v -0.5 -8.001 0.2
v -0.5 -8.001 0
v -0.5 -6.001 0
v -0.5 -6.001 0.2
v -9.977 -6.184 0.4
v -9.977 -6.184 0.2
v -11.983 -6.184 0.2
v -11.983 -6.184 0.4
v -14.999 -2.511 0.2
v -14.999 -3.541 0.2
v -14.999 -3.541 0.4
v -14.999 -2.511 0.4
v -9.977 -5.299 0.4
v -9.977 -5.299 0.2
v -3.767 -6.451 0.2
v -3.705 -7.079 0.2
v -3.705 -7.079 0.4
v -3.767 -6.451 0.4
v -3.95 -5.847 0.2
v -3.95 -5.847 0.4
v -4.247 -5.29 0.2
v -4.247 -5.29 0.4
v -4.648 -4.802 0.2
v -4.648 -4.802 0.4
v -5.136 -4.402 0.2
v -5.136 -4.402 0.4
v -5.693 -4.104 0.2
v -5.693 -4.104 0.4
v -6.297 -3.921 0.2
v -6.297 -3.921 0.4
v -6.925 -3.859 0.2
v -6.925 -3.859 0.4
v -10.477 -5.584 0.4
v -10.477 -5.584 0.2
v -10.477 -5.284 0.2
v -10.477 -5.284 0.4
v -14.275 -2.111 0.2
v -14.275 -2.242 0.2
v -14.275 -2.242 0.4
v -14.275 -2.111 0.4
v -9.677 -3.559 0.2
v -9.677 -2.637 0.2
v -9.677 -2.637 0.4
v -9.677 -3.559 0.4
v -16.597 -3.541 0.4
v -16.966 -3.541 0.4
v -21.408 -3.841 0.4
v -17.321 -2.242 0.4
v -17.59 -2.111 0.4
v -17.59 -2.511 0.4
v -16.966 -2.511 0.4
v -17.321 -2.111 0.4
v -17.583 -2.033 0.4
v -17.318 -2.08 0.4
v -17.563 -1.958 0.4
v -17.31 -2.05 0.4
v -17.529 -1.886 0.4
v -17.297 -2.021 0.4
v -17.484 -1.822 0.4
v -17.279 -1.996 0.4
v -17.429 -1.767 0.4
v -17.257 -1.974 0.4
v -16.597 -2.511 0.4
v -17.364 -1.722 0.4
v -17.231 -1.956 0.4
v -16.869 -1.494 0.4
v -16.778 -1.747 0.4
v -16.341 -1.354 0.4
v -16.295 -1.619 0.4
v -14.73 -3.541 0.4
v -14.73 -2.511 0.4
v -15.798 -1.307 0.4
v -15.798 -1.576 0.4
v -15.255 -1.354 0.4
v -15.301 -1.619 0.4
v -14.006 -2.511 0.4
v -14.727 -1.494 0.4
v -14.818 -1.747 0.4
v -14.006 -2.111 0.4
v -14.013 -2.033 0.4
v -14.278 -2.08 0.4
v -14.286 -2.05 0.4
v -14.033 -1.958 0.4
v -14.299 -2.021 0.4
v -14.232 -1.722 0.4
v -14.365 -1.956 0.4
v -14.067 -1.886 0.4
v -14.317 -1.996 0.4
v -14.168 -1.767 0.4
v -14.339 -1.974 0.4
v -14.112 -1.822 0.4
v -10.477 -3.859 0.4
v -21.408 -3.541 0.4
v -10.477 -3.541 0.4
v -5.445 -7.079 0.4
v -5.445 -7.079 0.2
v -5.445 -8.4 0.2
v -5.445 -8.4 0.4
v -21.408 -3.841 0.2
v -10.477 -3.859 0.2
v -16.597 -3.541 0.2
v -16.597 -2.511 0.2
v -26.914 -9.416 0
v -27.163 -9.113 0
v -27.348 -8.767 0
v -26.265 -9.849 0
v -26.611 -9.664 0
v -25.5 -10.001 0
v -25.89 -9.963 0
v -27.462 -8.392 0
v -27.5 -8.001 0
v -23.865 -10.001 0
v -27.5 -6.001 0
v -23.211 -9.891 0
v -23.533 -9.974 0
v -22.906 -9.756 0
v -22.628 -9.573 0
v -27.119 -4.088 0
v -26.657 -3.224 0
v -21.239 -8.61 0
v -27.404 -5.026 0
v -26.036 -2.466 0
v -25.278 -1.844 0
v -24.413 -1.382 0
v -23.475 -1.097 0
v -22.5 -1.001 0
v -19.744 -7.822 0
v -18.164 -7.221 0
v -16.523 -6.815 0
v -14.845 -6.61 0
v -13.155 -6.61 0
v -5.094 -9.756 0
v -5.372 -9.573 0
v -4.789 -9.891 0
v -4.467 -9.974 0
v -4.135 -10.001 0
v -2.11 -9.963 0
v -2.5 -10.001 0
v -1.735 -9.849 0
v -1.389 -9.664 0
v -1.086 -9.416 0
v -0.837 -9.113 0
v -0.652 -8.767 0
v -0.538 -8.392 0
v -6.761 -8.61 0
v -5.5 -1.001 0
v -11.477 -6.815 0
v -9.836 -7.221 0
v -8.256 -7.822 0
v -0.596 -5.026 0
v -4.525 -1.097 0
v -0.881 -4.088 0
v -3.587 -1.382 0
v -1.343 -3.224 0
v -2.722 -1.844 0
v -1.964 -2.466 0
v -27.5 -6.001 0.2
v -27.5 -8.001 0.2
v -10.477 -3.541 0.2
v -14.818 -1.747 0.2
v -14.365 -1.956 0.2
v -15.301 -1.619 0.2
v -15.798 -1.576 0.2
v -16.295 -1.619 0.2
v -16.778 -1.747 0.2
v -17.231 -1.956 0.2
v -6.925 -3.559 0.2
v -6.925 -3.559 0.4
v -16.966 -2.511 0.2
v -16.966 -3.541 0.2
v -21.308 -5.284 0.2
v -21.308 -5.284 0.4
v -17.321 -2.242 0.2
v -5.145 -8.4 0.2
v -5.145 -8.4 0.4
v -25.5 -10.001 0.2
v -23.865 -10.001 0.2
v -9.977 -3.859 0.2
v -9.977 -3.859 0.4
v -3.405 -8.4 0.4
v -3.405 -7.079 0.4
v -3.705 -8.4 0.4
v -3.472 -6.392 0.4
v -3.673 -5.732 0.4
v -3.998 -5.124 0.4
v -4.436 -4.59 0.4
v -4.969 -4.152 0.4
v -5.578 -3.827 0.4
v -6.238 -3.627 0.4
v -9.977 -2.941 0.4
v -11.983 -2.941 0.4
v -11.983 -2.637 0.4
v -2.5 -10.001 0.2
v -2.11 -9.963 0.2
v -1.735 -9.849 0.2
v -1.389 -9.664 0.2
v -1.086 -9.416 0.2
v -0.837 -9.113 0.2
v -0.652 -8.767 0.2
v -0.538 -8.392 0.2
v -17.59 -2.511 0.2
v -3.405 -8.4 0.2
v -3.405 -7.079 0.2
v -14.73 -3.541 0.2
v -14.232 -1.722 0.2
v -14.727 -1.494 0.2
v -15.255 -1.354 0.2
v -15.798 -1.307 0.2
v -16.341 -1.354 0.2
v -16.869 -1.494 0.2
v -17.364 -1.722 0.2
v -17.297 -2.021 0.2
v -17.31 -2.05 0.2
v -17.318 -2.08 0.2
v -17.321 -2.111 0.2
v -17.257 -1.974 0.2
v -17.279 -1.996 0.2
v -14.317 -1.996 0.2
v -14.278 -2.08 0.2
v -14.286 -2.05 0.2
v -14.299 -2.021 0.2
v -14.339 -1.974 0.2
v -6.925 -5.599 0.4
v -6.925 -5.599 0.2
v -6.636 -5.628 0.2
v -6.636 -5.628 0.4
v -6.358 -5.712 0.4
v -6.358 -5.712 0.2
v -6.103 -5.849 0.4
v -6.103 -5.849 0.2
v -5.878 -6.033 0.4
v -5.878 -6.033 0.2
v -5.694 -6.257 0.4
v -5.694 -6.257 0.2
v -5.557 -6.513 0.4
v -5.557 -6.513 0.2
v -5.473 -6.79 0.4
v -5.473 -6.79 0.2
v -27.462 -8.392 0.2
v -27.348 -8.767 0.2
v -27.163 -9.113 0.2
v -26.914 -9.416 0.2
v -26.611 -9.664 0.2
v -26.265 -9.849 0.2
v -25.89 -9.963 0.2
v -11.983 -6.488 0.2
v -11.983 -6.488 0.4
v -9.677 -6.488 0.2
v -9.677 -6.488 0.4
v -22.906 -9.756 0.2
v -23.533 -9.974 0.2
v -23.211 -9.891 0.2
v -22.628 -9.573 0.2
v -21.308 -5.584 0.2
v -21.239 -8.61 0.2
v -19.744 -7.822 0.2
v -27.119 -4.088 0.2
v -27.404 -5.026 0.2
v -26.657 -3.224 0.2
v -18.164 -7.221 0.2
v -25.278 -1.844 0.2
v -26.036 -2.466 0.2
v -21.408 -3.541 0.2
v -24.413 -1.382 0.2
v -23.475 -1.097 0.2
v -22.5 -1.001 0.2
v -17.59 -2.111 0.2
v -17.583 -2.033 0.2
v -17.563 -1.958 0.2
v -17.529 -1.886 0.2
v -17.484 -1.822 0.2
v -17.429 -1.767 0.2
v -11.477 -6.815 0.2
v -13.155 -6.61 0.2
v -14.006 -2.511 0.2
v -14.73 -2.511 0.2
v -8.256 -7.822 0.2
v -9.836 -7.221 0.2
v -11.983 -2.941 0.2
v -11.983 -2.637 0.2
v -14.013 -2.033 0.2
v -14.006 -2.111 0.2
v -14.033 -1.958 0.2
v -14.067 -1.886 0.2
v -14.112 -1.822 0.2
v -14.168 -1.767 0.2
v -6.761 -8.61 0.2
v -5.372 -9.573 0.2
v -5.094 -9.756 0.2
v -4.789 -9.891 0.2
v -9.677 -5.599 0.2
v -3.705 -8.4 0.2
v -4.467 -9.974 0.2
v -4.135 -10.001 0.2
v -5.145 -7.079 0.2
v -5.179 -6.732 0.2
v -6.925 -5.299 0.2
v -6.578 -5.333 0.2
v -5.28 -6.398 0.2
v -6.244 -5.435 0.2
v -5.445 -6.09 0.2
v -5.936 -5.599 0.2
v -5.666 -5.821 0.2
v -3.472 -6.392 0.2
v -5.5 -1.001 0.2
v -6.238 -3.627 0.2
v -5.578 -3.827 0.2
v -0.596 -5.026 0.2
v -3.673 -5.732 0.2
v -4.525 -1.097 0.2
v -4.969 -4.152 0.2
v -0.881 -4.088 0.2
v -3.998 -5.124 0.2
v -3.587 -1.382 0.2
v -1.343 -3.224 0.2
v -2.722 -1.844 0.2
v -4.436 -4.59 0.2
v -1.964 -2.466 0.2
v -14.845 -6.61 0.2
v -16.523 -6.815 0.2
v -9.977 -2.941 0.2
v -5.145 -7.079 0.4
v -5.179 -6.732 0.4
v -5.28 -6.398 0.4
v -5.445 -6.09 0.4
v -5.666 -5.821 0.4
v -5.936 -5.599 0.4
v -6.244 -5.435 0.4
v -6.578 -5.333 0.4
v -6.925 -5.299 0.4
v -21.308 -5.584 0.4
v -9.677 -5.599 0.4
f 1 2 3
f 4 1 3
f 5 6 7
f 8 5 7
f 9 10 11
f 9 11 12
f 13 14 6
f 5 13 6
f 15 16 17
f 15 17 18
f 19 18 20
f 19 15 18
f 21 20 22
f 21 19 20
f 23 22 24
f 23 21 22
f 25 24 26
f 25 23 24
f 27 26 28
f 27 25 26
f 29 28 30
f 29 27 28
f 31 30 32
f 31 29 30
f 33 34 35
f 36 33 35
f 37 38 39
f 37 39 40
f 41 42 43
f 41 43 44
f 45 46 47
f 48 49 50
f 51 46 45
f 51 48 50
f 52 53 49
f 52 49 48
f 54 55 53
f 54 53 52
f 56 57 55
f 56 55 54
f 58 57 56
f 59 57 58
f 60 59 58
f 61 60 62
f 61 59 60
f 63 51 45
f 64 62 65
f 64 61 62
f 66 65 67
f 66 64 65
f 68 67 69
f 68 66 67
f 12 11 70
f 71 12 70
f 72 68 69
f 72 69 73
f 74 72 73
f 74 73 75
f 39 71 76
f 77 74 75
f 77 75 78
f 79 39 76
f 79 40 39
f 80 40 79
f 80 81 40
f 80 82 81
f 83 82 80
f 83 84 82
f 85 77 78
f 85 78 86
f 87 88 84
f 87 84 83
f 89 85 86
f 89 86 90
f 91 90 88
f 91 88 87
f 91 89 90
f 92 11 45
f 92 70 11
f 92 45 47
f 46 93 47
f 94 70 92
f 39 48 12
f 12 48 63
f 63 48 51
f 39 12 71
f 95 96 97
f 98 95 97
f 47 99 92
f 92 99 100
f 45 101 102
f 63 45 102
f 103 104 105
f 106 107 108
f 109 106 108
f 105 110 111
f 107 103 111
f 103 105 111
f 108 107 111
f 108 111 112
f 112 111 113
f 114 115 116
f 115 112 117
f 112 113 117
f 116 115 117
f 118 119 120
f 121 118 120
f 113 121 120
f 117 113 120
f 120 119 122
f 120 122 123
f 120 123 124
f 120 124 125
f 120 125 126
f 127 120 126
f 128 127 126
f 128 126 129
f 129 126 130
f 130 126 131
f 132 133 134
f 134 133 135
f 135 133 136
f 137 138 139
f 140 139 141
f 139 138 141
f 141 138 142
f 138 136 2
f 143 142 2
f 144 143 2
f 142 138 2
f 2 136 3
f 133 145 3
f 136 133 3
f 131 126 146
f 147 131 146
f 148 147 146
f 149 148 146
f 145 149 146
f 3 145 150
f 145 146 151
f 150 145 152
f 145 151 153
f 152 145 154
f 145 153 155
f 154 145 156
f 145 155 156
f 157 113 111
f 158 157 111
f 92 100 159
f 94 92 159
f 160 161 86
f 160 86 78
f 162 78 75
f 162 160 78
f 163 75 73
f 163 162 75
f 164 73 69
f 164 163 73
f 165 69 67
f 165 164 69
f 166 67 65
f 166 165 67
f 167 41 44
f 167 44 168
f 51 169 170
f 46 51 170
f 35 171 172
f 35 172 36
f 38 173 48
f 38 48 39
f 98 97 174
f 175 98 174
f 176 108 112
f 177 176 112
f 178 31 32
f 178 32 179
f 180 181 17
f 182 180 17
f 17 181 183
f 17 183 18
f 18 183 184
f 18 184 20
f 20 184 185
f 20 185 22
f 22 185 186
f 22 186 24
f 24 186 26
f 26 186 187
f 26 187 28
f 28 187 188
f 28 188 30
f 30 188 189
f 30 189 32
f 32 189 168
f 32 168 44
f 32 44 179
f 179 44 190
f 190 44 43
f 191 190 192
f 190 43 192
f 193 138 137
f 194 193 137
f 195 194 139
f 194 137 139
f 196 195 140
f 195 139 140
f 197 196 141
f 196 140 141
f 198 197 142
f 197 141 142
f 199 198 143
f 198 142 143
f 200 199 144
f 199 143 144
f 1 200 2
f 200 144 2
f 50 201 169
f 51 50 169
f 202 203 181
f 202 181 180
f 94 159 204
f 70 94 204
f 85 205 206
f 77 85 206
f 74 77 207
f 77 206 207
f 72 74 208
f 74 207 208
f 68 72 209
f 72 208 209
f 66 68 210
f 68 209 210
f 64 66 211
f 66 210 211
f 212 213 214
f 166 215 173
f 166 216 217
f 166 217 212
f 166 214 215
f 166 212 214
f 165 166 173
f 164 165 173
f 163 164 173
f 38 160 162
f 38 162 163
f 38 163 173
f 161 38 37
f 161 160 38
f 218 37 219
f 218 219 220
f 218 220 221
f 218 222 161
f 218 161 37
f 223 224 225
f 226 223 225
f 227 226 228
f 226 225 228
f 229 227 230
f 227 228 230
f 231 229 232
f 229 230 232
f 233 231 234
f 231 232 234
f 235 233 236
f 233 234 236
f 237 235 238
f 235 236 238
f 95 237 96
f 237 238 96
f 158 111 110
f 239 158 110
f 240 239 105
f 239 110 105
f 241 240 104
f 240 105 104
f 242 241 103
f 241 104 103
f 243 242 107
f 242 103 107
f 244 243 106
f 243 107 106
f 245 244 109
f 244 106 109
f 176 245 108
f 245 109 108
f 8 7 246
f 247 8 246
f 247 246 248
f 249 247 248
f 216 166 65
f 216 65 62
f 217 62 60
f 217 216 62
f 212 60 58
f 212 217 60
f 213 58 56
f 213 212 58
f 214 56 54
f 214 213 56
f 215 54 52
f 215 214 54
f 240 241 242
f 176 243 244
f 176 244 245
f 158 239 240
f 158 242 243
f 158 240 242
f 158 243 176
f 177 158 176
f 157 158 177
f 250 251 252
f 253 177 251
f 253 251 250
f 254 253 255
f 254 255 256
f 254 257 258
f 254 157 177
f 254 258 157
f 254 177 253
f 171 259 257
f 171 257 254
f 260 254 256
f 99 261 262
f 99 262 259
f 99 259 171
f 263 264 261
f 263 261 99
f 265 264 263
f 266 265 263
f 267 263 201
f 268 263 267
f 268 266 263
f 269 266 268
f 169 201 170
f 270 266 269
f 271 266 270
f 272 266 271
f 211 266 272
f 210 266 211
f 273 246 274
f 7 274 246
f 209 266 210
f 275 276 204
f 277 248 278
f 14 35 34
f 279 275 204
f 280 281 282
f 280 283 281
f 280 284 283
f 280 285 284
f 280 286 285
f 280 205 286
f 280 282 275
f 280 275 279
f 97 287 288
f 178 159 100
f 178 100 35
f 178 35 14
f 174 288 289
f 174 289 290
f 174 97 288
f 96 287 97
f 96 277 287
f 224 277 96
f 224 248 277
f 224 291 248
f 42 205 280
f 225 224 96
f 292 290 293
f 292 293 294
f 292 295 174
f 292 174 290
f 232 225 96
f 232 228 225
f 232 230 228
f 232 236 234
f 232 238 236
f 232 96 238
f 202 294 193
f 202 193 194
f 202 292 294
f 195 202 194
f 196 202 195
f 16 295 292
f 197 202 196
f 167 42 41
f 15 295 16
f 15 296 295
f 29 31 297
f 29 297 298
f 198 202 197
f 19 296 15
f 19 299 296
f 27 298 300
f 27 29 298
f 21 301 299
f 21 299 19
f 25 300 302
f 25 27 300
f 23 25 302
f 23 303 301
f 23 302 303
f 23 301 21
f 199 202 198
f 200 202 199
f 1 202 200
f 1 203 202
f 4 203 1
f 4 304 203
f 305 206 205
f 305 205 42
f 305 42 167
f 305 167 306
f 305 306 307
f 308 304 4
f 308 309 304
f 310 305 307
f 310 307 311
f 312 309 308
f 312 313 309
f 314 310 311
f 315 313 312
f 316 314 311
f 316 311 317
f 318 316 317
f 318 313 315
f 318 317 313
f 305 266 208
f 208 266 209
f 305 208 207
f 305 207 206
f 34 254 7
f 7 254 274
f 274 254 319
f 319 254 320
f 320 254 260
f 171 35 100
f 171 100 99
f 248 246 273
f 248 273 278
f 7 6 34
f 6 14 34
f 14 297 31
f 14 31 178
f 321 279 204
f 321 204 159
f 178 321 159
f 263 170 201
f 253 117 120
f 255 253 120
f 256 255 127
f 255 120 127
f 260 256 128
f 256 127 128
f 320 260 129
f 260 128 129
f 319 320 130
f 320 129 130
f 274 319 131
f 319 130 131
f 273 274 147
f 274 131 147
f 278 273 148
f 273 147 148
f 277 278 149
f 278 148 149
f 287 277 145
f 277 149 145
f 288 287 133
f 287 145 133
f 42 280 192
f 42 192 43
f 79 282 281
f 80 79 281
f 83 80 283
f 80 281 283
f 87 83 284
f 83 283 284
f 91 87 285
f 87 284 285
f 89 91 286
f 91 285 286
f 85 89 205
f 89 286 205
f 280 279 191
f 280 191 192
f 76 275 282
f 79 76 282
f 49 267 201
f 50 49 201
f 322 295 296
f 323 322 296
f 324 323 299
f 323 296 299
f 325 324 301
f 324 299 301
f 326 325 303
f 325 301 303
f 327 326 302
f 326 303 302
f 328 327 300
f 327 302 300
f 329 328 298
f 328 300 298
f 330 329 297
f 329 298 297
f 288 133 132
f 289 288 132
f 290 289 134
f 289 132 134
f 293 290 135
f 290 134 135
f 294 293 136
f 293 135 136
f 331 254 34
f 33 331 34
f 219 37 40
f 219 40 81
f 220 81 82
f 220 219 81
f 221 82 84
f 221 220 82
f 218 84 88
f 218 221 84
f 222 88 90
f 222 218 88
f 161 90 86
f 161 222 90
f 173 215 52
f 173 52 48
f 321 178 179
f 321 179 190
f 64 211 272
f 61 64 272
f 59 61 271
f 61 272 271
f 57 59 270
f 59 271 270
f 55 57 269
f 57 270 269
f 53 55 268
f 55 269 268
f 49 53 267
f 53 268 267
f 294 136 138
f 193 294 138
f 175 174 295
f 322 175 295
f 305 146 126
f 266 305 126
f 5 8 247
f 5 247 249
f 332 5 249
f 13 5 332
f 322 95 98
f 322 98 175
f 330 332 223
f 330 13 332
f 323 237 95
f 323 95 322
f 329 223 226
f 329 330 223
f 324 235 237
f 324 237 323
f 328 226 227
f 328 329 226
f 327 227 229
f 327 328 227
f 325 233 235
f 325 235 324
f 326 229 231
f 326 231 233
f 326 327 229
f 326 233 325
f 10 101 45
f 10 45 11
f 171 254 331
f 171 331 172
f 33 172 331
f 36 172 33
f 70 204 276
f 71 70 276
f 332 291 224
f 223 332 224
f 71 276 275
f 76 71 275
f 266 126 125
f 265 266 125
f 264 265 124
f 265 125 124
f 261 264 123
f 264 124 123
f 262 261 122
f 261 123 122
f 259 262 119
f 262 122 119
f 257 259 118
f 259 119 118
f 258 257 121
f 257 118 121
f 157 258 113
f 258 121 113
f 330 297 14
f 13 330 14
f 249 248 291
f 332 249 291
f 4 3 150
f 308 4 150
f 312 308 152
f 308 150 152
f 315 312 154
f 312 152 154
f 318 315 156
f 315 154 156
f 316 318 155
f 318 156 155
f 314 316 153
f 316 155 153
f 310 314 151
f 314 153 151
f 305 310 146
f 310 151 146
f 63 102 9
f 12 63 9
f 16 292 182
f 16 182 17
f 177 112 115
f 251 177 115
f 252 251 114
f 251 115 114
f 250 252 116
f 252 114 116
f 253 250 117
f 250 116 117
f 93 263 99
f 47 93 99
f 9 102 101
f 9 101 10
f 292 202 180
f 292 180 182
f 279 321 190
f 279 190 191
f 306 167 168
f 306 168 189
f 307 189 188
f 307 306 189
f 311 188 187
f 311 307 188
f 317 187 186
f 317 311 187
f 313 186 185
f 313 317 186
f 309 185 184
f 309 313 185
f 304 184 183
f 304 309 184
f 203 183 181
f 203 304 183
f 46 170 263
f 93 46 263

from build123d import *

# Parameters (mm, degrees)
EXTRUSION1_DEPTH = 0.2
ESQUISSE2_W      = 1.59785128
ESQUISSE2_H      = 1.03077013
ESQUISSE2_W_2    = 10.83121002
ESQUISSE2_H_2    = 0.3
EXTRUSION2_DEPTH = 0.2


with BuildPart() as part:
    # Esquisse1 → Extrusion1 (new body)
    with BuildSketch(Plane.XY):
        with BuildLine():
            Line((-27.5, -6.00142003), (-27.5, -8.00142003))
            ThreePointArc((-27.5, -8.00142003), (-26.914213562, -9.415633592), (-25.5, -10.00142003))
            Line((-25.5, -10.00142003), (-23.865139014, -10.00142003))
            ThreePointArc((-23.865139014, -10.00142003), (-23.210588236, -9.891278035), (-22.628130987, -9.572983309))
            ThreePointArc((-22.628130987, -9.572983309), (-14, -6.584637184), (-5.371869013, -9.572983309))
            ThreePointArc((-5.371869013, -9.572983309), (-4.789411764, -9.891278035), (-4.134860986, -10.00142003))
            Line((-4.134860986, -10.00142003), (-2.5, -10.00142003))
            ThreePointArc((-2.5, -10.00142003), (-1.085786438, -9.415633592), (-0.5, -8.00142003))
            Line((-0.5, -8.00142003), (-0.5, -6.00142003))
            ThreePointArc((-0.5, -6.00142003), (-1.964466094, -2.465886124), (-5.5, -1.00142003))
            Line((-5.5, -1.00142003), (-22.5, -1.00142003))
            ThreePointArc((-22.5, -1.00142003), (-26.035533906, -2.465886124), (-27.5, -6.00142003))
        make_face()
    extrude(amount=EXTRUSION1_DEPTH)

    # Esquisse2 → Extrusion2 (add)
    # profile 1 of 4: a face of its own
    with BuildSketch(Plane.XY.offset(0.2)):
        with BuildLine():
            Line((-14.730316635, -2.510657311), (-14.006042275, -2.510657311))
            Line((-14.006042275, -2.510657311), (-14.006042275, -2.111468697))
            ThreePointArc((-14.006042275, -2.111468697), (-14.066642884, -1.886467114), (-14.232049919, -1.722337108))
            ThreePointArc((-14.232049919, -1.722337108), (-15.798042275, -1.307063885), (-17.364034631, -1.722337108))
            ThreePointArc((-17.364034631, -1.722337108), (-17.529441665, -1.886467114), (-17.590042275, -2.111468697))
            Line((-17.590042275, -2.111468697), (-17.590042275, -2.510657311))
            Line((-17.590042275, -2.510657311), (-16.965767915, -2.510657311))
            Line((-16.965767915, -2.510657311), (-16.965767915, -3.541427441))
            Line((-16.965767915, -3.541427441), (-21.408442275, -3.541427441))
            Line((-21.408442275, -3.541427441), (-21.408442275, -3.841427441))
            Line((-21.408442275, -3.841427441), (-10.477242275, -3.859176516))
            Line((-10.477242275, -3.859176516), (-10.477242275, -3.541427441))
            Line((-10.477242275, -3.541427441), (-14.730316635, -3.541427441))
            Line((-14.730316635, -3.541427441), (-14.730316635, -2.510657311))
        make_face()
        with Locations((-15.798042275, -3.026042376)):
            Rectangle(ESQUISSE2_W, ESQUISSE2_H, mode=Mode.SUBTRACT)
        with BuildLine():
            Line((-17.321242275, -2.241857311), (-14.274842275, -2.241857311))
            Line((-14.274842275, -2.241857311), (-14.274842275, -2.111468697))
            ThreePointArc((-14.274842275, -2.111468697), (-14.299082519, -2.021468064), (-14.365245332, -1.955816061))
            ThreePointArc((-14.365245332, -1.955816061), (-15.798042275, -1.575863885), (-17.230839217, -1.955816061))
            ThreePointArc((-17.230839217, -1.955816061), (-17.297002031, -2.021468064), (-17.321242275, -2.111468697))
            Line((-17.321242275, -2.111468697), (-17.321242275, -2.241857311))
        make_face(mode=Mode.SUBTRACT)
    # profile 2 of 4: a face of its own
    with BuildSketch(Plane.XY.offset(0.2)):
        with Locations((-15.892837265, -5.434307441)):
            Rectangle(ESQUISSE2_W_2, ESQUISSE2_H_2)
    # profile 3 of 4: a face of its own
    with BuildSketch(Plane.XY.offset(0.2)):
        with BuildLine():
            Line((-11.983013473, -2.941427441), (-11.983013473, -2.637464752))
            Line((-11.983013473, -2.637464752), (-9.677242275, -2.637464752))
            Line((-9.677242275, -2.637464752), (-9.677242275, -3.559176516))
            Line((-9.677242275, -3.559176516), (-6.924787178, -3.559176516))
            ThreePointArc((-6.924787178, -3.559176516), (-4.435771308, -4.590160647), (-3.404787178, -7.079176516))
            Line((-3.404787178, -7.079176516), (-3.404787178, -8.399718672))
            Line((-3.404787178, -8.399718672), (-3.704787178, -8.399718672))
            Line((-3.704787178, -8.399718672), (-3.704787178, -7.079176516))
            ThreePointArc((-3.704787178, -7.079176516), (-4.647903343, -4.802292681), (-6.924787178, -3.859176516))
            Line((-6.924787178, -3.859176516), (-9.977242275, -3.859176516))
            Line((-9.977242275, -3.859176516), (-9.977242275, -2.941427441))
            Line((-9.977242275, -2.941427441), (-11.983013473, -2.941427441))
        make_face()
    # profile 4 of 4: a face of its own
    with BuildSketch(Plane.XY.offset(0.2)):
        with BuildLine():
            Line((-5.444787178, -7.079176516), (-5.444787178, -8.399718672))
            Line((-5.444787178, -8.399718672), (-5.144787178, -8.399718672))
            Line((-5.144787178, -8.399718672), (-5.144787178, -7.079176516))
            ThreePointArc((-5.144787178, -7.079176516), (-5.666137108, -5.820526446), (-6.924787178, -5.299176516))
            Line((-6.924787178, -5.299176516), (-9.977242275, -5.299176516))
            Line((-9.977242275, -5.299176516), (-9.977242275, -6.184307441))
            Line((-9.977242275, -6.184307441), (-11.983013473, -6.184307441))
            Line((-11.983013473, -6.184307441), (-11.983013473, -6.488270129))
            Line((-11.983013473, -6.488270129), (-9.677242275, -6.488270129))
            Line((-9.677242275, -6.488270129), (-9.677242275, -5.599176516))
            Line((-9.677242275, -5.599176516), (-6.924787178, -5.599176516))
            ThreePointArc((-6.924787178, -5.599176516), (-5.878269142, -6.03265848), (-5.444787178, -7.079176516))
        make_face()
    extrude(amount=EXTRUSION2_DEPTH)


solid = part.part
